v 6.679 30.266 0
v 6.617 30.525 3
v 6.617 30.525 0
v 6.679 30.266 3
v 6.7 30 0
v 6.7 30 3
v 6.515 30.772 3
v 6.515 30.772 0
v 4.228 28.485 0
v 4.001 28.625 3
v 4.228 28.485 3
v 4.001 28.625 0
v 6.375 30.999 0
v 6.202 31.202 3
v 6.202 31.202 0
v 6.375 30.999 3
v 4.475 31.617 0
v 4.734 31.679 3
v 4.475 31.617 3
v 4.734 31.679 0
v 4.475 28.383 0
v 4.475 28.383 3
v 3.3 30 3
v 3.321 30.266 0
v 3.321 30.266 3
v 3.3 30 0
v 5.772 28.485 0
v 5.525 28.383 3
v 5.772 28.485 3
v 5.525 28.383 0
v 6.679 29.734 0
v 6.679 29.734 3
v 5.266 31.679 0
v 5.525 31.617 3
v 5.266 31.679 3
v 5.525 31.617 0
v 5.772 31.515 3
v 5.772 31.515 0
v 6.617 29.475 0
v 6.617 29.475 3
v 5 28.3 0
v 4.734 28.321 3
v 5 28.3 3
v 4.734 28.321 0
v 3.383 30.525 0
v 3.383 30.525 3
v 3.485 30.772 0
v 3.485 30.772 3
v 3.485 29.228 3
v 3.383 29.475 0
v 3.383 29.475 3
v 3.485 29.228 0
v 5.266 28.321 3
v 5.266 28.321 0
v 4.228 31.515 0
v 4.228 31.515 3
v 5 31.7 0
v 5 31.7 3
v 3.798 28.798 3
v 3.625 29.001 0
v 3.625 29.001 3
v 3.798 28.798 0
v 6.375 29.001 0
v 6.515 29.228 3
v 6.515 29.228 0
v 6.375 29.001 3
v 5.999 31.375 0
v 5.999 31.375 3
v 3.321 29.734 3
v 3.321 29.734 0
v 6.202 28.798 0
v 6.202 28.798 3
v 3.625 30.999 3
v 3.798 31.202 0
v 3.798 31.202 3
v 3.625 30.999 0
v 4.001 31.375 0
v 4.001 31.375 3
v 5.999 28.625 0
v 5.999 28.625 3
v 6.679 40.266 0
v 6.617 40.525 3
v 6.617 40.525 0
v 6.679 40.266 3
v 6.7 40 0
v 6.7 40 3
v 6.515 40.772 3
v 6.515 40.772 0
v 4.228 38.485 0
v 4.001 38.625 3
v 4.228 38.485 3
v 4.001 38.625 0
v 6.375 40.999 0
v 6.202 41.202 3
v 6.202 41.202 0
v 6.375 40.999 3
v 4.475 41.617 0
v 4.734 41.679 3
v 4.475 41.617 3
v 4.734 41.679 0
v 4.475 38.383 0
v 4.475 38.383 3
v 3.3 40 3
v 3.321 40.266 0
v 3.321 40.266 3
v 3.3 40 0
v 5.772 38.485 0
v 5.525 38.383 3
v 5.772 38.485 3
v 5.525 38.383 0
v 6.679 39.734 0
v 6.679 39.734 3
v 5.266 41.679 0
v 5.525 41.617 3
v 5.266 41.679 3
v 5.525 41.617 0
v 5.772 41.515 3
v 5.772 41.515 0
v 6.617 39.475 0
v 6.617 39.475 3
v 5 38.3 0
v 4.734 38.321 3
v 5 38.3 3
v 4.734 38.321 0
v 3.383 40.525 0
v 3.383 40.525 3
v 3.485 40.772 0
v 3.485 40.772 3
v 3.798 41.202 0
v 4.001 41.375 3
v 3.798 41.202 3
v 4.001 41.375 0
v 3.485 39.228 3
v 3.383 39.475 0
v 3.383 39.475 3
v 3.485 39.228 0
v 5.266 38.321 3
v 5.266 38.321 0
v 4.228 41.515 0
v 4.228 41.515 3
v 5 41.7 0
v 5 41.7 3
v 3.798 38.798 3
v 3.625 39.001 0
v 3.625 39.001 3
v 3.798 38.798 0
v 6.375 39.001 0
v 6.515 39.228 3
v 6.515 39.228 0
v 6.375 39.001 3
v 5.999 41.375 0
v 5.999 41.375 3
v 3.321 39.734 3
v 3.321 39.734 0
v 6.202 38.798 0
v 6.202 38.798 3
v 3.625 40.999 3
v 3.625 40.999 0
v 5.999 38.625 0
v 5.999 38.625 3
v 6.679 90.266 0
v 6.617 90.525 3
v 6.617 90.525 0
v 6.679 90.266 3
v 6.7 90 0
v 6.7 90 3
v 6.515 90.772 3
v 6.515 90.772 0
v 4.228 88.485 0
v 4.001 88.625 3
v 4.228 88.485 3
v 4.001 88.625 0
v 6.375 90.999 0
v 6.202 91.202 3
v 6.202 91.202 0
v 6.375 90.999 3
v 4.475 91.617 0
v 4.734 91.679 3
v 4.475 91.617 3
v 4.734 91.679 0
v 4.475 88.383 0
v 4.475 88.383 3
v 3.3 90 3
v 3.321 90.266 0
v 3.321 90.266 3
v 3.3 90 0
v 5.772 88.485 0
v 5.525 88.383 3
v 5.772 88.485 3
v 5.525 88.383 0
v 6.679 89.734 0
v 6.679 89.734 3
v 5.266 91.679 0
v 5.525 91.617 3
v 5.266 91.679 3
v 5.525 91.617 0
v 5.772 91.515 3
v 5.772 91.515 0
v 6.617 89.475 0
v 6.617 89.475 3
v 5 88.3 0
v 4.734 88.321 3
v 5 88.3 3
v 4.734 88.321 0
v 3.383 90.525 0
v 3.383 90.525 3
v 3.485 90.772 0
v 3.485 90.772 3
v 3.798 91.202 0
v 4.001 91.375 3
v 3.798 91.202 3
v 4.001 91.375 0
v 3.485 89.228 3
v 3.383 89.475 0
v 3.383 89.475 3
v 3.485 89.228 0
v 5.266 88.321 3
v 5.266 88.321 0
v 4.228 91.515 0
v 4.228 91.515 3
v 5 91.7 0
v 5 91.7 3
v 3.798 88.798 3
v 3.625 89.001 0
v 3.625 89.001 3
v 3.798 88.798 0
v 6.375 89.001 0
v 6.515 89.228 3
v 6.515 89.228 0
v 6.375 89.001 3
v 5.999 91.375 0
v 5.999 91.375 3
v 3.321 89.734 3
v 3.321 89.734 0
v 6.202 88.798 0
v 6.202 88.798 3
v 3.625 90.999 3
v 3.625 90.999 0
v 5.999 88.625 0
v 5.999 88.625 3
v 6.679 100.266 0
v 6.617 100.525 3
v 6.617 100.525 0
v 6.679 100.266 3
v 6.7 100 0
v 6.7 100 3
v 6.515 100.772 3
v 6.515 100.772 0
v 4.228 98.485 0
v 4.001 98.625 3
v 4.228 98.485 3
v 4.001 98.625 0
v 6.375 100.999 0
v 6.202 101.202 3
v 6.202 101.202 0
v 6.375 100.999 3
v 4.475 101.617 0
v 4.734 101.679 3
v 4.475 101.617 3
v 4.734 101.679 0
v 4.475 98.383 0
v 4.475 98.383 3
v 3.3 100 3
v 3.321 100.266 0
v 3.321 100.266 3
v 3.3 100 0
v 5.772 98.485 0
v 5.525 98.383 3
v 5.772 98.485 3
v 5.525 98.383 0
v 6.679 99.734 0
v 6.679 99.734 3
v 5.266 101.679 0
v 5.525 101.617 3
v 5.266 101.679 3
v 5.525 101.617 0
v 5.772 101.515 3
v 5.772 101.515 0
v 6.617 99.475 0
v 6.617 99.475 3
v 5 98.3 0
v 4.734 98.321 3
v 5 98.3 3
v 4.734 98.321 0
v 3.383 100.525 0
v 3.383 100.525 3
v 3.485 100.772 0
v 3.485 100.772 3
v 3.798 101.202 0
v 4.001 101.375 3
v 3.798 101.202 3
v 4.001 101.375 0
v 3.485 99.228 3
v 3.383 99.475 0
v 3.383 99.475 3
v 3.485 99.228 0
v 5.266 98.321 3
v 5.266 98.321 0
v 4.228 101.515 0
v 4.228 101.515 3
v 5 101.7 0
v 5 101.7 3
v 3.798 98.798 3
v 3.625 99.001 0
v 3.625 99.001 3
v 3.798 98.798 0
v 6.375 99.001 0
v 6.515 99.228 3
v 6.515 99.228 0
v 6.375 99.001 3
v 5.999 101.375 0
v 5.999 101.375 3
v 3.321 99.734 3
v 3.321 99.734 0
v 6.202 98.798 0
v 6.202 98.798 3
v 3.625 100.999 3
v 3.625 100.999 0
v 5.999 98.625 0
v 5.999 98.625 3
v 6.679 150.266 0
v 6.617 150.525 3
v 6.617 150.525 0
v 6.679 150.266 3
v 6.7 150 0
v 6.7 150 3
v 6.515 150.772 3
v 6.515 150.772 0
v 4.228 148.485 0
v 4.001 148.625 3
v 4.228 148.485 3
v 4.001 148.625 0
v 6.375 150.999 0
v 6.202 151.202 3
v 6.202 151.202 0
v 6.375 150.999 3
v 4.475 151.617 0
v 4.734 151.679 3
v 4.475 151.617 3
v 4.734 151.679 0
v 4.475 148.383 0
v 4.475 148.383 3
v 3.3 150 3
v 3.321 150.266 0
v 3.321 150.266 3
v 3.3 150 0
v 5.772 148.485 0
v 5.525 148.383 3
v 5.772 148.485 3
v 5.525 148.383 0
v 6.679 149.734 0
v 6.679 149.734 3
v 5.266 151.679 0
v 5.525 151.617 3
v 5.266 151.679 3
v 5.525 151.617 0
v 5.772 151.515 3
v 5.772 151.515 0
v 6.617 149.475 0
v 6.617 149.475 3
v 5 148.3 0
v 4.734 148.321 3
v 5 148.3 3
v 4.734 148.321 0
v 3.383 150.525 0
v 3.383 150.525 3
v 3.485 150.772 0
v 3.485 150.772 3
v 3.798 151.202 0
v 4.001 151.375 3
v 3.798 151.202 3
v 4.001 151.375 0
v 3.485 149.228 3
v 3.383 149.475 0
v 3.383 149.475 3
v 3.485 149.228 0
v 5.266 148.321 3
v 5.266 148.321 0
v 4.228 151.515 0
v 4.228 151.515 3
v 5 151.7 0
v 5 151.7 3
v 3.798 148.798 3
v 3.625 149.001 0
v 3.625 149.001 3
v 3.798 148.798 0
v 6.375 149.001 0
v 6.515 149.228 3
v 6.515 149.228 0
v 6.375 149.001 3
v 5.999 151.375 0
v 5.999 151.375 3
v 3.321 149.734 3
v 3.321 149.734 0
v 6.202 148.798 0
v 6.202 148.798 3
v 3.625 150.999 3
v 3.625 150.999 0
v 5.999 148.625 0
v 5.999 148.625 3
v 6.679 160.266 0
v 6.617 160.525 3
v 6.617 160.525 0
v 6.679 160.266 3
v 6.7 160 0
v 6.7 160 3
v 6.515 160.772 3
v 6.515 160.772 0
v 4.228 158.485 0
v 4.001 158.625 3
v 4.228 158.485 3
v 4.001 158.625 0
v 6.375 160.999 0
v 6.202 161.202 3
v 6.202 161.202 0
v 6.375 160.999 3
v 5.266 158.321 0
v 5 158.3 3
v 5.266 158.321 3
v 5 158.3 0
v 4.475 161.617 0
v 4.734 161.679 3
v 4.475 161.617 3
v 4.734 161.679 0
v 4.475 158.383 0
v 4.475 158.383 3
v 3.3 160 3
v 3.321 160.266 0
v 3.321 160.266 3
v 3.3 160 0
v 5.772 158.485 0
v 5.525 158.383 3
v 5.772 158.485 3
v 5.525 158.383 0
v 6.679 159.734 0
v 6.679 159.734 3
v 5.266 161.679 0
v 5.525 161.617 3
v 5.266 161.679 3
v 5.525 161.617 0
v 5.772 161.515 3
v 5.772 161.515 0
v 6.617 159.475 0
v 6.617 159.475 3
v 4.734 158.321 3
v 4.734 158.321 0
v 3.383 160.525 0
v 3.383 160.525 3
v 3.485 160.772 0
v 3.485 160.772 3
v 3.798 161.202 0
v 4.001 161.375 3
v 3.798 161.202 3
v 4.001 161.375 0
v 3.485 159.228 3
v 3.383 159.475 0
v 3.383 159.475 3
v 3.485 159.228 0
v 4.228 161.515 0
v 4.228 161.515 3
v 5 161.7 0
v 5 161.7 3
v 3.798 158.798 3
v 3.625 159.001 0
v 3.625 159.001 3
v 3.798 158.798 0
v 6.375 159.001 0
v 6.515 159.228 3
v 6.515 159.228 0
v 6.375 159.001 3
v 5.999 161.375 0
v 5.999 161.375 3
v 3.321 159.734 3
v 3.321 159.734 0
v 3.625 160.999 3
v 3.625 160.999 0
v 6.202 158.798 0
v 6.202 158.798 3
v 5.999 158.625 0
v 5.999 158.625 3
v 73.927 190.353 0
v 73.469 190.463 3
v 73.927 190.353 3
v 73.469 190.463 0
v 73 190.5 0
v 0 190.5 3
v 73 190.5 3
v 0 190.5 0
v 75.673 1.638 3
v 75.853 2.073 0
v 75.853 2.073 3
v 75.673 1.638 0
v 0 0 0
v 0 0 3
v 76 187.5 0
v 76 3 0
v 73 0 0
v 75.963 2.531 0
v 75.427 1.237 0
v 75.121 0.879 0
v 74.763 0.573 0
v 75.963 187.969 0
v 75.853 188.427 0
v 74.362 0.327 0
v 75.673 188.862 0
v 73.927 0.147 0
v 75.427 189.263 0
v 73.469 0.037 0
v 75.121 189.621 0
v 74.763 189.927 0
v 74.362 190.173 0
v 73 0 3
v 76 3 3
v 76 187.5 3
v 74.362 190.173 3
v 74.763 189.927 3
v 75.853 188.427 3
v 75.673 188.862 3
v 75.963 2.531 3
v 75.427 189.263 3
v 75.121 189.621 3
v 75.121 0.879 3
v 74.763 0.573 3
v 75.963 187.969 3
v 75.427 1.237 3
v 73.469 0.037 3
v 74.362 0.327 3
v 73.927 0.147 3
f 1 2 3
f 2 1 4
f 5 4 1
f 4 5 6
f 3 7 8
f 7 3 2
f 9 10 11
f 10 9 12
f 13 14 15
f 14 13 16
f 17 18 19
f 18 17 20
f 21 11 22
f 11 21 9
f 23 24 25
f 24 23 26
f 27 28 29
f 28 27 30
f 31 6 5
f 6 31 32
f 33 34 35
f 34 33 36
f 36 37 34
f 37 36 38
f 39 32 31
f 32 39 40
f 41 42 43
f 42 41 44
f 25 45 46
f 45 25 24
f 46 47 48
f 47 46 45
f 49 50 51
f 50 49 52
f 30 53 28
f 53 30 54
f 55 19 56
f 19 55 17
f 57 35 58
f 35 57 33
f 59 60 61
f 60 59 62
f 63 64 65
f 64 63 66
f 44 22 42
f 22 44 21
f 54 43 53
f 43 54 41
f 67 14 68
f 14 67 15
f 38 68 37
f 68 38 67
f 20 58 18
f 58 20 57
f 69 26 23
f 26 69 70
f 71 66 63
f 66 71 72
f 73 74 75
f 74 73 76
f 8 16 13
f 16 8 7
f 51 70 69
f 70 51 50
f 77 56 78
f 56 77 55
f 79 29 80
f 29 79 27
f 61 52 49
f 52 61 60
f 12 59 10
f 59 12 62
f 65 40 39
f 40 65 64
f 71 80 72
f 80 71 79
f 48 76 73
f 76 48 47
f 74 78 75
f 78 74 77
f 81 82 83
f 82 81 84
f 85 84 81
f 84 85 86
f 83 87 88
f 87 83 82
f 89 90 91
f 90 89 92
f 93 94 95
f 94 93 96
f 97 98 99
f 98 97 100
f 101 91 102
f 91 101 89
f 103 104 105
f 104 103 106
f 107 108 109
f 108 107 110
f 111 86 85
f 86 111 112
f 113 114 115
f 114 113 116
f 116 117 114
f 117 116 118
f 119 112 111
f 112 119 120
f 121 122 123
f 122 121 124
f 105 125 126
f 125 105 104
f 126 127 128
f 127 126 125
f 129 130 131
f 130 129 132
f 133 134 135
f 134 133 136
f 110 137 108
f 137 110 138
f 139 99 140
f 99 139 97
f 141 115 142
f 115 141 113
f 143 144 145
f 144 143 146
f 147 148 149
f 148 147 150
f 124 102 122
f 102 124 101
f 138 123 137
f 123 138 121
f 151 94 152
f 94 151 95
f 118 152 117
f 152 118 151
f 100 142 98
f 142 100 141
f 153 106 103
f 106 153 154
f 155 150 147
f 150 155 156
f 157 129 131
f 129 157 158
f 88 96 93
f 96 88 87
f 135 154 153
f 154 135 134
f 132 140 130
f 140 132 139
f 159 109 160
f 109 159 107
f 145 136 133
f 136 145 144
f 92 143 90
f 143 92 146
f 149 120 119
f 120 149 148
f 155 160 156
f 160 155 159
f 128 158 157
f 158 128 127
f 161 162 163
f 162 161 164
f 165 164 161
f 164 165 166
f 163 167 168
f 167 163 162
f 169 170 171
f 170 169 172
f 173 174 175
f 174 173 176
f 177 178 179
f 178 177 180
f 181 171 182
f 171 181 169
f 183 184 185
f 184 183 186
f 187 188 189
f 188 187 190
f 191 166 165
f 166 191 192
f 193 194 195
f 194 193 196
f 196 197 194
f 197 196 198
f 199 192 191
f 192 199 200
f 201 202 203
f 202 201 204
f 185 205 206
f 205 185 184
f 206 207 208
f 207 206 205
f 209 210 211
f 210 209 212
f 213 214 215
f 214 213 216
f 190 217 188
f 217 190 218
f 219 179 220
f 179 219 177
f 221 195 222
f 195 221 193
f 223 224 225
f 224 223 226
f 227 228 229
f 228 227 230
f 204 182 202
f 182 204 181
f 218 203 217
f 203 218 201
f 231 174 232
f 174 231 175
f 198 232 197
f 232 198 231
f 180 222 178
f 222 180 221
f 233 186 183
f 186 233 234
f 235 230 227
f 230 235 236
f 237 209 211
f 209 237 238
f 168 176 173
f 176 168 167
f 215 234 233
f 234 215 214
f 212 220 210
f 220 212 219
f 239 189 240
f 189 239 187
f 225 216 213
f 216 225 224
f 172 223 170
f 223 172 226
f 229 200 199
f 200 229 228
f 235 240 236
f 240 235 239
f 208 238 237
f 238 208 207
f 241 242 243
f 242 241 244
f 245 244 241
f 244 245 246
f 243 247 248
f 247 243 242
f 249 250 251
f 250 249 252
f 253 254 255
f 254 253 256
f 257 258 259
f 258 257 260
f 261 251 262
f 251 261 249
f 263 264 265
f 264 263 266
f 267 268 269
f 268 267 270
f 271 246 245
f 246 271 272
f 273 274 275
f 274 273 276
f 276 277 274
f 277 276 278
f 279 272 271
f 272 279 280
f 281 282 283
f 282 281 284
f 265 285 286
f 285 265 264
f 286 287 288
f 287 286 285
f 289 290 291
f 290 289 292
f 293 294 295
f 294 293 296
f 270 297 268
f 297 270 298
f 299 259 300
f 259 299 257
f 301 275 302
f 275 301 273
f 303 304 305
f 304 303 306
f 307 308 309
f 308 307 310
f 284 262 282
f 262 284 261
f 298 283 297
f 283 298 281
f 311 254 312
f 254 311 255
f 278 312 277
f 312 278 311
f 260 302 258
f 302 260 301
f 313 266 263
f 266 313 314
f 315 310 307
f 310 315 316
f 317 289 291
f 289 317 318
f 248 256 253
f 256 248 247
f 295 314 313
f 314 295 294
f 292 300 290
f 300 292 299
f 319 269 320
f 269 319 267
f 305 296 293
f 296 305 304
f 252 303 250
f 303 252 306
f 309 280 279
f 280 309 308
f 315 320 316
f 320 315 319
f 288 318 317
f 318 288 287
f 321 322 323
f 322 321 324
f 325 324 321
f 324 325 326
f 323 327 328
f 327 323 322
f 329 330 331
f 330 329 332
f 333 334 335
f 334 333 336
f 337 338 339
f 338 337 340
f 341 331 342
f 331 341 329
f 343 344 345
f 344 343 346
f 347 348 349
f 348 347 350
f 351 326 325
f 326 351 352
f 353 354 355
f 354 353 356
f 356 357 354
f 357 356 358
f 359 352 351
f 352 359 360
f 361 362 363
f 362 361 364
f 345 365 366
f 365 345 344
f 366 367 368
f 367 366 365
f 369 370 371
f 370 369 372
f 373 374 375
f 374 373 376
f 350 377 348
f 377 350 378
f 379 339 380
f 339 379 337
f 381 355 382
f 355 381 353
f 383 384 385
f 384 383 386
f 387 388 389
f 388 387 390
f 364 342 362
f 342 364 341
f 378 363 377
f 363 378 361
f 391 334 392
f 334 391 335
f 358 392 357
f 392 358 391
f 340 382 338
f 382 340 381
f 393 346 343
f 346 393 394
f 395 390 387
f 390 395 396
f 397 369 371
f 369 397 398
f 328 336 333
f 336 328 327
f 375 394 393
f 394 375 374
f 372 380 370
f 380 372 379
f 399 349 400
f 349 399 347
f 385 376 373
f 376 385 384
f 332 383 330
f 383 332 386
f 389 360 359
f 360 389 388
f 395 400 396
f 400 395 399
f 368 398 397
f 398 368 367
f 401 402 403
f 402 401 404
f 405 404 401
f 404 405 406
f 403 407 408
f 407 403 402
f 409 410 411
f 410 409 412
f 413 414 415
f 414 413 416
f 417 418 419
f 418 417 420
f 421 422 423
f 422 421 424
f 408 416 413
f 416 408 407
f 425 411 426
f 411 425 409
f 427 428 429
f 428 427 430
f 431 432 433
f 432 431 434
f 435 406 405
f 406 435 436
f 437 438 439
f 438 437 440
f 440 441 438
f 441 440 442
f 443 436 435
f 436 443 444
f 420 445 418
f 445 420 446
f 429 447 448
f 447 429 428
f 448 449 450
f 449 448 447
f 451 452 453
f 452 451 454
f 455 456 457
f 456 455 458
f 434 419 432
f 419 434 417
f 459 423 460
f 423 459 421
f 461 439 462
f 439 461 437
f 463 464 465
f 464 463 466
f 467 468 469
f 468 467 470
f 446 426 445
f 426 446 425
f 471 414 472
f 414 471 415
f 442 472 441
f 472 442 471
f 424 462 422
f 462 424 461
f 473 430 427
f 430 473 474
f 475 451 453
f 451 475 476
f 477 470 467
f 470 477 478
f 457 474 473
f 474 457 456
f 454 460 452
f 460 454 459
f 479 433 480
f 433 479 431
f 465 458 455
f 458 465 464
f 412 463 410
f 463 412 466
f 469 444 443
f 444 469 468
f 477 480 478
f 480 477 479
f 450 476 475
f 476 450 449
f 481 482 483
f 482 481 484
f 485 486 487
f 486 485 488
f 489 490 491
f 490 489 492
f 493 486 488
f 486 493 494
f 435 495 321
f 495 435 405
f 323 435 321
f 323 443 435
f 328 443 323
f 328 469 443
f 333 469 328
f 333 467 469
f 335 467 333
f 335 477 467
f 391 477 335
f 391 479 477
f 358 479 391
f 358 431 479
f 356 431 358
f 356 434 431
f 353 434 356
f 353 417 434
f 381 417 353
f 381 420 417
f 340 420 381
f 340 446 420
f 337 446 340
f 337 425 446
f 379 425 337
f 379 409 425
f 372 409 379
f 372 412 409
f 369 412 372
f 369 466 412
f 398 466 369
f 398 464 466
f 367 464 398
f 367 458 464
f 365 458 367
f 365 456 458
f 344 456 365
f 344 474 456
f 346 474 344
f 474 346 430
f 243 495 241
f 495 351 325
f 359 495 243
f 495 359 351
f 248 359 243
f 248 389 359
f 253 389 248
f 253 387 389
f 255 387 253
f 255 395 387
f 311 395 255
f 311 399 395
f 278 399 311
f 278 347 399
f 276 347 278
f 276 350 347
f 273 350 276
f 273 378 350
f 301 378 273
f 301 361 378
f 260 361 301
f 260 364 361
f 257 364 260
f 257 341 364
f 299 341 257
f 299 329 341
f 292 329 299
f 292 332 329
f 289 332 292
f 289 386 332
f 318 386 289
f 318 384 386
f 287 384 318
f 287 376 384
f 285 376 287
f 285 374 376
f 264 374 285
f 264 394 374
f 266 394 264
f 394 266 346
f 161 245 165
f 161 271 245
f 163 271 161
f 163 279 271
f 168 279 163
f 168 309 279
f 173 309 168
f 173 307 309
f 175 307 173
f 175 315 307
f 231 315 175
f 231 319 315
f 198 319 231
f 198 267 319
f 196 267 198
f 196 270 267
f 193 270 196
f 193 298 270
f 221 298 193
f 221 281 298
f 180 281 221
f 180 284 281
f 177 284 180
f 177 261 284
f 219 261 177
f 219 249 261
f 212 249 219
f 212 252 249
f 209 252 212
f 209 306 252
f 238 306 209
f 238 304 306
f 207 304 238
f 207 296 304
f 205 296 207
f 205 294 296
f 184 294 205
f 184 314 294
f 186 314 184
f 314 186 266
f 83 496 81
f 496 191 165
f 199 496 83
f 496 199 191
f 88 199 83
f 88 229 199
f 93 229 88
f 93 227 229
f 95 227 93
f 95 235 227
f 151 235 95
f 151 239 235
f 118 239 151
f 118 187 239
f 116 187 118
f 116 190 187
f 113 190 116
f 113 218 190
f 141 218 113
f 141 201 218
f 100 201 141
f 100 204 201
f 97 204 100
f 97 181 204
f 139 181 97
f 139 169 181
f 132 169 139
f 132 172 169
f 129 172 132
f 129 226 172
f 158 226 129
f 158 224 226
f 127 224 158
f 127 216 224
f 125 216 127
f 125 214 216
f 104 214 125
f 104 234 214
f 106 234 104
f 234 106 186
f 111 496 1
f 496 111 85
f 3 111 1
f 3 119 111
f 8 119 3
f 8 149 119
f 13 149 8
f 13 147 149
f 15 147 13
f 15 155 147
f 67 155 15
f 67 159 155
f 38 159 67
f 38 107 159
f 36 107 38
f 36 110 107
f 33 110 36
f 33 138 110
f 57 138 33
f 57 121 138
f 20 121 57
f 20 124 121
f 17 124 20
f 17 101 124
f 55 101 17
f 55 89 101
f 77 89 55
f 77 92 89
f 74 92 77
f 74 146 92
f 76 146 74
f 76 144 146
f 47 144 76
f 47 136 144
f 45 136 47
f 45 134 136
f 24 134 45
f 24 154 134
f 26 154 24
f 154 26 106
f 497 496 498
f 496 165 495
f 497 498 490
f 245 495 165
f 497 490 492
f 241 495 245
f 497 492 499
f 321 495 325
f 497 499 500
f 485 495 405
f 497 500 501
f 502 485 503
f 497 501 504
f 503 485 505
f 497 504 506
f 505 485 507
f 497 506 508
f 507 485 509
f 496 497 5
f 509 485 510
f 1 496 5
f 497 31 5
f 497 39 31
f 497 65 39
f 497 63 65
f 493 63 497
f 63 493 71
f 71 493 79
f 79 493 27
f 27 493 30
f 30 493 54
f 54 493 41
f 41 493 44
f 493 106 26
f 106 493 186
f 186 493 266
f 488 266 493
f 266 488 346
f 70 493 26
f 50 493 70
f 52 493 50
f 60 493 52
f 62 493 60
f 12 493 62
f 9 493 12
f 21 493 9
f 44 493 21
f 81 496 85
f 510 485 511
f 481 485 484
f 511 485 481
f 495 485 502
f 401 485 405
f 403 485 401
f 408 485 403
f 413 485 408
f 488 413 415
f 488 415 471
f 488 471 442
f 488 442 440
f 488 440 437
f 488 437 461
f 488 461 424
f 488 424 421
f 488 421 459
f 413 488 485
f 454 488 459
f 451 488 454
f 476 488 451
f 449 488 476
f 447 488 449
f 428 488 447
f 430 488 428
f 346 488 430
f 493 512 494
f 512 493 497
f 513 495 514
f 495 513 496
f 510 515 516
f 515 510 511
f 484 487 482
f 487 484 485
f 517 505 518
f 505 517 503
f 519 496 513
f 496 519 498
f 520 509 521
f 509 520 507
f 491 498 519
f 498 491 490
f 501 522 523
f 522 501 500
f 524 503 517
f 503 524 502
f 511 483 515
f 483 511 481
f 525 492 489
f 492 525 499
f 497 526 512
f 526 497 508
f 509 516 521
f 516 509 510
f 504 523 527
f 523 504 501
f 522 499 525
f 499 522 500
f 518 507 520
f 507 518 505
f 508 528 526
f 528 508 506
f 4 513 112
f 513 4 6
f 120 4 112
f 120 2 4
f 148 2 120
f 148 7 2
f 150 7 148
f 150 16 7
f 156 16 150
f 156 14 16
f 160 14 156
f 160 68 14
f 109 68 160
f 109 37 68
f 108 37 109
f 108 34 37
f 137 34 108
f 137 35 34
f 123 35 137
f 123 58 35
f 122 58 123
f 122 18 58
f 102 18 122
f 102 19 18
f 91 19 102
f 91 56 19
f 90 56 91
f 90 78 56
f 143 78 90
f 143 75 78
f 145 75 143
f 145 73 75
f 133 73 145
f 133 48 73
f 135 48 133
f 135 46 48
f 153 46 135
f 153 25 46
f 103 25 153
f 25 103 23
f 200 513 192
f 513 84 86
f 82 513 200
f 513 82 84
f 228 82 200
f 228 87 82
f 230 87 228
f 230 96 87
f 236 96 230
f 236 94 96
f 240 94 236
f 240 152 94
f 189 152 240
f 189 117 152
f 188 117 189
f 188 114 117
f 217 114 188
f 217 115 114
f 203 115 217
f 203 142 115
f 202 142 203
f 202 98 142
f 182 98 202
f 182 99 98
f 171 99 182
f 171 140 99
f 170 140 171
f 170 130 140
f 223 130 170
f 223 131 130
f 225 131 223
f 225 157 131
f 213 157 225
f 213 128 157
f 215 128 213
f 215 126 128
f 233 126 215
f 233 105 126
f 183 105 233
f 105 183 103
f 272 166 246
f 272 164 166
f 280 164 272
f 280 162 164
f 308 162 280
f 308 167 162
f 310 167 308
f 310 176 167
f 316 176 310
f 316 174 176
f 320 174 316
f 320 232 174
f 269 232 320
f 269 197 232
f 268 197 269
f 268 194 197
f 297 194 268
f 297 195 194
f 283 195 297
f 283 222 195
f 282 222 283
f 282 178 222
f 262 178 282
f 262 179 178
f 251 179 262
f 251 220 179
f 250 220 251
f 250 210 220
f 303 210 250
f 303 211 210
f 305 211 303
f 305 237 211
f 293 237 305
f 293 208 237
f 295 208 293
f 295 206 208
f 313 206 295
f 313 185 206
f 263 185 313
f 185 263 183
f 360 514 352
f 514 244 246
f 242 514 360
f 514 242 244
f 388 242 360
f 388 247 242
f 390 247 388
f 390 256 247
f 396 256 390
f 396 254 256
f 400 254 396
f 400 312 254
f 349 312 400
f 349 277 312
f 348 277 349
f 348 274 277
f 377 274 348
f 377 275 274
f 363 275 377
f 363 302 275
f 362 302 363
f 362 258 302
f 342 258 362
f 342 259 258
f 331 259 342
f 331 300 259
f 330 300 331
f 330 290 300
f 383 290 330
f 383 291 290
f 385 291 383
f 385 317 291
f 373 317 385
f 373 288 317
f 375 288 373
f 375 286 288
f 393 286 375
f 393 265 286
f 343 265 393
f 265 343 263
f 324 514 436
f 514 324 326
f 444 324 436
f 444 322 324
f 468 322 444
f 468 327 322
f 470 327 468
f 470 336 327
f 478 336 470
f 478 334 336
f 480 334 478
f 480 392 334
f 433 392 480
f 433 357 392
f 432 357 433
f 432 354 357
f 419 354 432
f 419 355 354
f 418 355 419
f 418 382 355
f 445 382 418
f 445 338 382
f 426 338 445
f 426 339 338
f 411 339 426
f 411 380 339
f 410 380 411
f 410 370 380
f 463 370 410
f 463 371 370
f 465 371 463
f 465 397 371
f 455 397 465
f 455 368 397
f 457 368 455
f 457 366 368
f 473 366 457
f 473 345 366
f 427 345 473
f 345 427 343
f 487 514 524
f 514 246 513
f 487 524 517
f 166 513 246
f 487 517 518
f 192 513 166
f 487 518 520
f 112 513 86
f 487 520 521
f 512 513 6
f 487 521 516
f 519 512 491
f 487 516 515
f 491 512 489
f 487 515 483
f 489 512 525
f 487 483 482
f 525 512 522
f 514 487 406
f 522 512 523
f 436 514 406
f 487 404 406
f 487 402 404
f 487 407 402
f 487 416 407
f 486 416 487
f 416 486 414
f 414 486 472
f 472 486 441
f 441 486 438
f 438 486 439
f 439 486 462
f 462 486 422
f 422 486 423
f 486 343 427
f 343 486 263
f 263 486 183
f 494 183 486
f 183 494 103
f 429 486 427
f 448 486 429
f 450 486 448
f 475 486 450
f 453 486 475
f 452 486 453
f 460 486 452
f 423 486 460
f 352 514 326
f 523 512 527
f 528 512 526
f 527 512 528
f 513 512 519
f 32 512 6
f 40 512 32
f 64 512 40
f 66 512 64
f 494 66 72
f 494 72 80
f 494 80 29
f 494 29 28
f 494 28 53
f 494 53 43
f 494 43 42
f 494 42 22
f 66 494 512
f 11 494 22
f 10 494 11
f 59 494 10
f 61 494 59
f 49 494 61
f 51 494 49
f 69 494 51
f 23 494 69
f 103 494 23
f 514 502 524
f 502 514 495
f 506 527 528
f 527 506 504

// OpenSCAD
// FoldIt Robot - Right Folding Panel
// Scale: 1:4
// Dimensions: 76mm x 190.5mm x 3mm
// Mirror of left panel - folds inward from the right side

$fn = 40;

// Panel parameters
panel_width = 76;       // ~half of base width (152.5 / 2)
panel_length = 190.5;   // full base length
panel_thickness = 3;

// Hinge hole parameters
m3_hole = 3.4;
hinge_hole_spacing = 30;
hinge_edge_offset = 5;       // distance from hinge edge to hole center
hinge_pair_gap = 10;

// Rounded edge radius
edge_radius = 3;

module right_panel() {
    difference() {
        // Main panel body with rounded outer edge (mirrored from left)
        _panel_body();

        // Hinge holes along inner (left) edge - matching base plate right edge
        for (i = [0:2]) {
            y_pos = 30 + i * hinge_hole_spacing * 2;
            for (j = [0:1]) {
                translate([hinge_edge_offset, y_pos + j * hinge_pair_gap, -0.5])
                    cylinder(d=m3_hole, h=panel_thickness + 1);
            }
        }
    }
}

module _panel_body() {
    // Panel with rounded right (outer) edge - mirror of left panel
    hull() {
        // Inner edge - square corners
        translate([0, 0, 0])
            cube([0.5, panel_length, panel_thickness]);

        // Outer edge - rounded
        translate([panel_width - edge_radius, edge_radius, 0])
            cylinder(r=edge_radius, h=panel_thickness);
        translate([panel_width - edge_radius, panel_length - edge_radius, 0])
            cylinder(r=edge_radius, h=panel_thickness);

        // Fill the middle
        translate([0, 0, 0])
            cube([panel_width - edge_radius, panel_length, panel_thickness]);
    }
}

// Render when opened directly
right_panel();
